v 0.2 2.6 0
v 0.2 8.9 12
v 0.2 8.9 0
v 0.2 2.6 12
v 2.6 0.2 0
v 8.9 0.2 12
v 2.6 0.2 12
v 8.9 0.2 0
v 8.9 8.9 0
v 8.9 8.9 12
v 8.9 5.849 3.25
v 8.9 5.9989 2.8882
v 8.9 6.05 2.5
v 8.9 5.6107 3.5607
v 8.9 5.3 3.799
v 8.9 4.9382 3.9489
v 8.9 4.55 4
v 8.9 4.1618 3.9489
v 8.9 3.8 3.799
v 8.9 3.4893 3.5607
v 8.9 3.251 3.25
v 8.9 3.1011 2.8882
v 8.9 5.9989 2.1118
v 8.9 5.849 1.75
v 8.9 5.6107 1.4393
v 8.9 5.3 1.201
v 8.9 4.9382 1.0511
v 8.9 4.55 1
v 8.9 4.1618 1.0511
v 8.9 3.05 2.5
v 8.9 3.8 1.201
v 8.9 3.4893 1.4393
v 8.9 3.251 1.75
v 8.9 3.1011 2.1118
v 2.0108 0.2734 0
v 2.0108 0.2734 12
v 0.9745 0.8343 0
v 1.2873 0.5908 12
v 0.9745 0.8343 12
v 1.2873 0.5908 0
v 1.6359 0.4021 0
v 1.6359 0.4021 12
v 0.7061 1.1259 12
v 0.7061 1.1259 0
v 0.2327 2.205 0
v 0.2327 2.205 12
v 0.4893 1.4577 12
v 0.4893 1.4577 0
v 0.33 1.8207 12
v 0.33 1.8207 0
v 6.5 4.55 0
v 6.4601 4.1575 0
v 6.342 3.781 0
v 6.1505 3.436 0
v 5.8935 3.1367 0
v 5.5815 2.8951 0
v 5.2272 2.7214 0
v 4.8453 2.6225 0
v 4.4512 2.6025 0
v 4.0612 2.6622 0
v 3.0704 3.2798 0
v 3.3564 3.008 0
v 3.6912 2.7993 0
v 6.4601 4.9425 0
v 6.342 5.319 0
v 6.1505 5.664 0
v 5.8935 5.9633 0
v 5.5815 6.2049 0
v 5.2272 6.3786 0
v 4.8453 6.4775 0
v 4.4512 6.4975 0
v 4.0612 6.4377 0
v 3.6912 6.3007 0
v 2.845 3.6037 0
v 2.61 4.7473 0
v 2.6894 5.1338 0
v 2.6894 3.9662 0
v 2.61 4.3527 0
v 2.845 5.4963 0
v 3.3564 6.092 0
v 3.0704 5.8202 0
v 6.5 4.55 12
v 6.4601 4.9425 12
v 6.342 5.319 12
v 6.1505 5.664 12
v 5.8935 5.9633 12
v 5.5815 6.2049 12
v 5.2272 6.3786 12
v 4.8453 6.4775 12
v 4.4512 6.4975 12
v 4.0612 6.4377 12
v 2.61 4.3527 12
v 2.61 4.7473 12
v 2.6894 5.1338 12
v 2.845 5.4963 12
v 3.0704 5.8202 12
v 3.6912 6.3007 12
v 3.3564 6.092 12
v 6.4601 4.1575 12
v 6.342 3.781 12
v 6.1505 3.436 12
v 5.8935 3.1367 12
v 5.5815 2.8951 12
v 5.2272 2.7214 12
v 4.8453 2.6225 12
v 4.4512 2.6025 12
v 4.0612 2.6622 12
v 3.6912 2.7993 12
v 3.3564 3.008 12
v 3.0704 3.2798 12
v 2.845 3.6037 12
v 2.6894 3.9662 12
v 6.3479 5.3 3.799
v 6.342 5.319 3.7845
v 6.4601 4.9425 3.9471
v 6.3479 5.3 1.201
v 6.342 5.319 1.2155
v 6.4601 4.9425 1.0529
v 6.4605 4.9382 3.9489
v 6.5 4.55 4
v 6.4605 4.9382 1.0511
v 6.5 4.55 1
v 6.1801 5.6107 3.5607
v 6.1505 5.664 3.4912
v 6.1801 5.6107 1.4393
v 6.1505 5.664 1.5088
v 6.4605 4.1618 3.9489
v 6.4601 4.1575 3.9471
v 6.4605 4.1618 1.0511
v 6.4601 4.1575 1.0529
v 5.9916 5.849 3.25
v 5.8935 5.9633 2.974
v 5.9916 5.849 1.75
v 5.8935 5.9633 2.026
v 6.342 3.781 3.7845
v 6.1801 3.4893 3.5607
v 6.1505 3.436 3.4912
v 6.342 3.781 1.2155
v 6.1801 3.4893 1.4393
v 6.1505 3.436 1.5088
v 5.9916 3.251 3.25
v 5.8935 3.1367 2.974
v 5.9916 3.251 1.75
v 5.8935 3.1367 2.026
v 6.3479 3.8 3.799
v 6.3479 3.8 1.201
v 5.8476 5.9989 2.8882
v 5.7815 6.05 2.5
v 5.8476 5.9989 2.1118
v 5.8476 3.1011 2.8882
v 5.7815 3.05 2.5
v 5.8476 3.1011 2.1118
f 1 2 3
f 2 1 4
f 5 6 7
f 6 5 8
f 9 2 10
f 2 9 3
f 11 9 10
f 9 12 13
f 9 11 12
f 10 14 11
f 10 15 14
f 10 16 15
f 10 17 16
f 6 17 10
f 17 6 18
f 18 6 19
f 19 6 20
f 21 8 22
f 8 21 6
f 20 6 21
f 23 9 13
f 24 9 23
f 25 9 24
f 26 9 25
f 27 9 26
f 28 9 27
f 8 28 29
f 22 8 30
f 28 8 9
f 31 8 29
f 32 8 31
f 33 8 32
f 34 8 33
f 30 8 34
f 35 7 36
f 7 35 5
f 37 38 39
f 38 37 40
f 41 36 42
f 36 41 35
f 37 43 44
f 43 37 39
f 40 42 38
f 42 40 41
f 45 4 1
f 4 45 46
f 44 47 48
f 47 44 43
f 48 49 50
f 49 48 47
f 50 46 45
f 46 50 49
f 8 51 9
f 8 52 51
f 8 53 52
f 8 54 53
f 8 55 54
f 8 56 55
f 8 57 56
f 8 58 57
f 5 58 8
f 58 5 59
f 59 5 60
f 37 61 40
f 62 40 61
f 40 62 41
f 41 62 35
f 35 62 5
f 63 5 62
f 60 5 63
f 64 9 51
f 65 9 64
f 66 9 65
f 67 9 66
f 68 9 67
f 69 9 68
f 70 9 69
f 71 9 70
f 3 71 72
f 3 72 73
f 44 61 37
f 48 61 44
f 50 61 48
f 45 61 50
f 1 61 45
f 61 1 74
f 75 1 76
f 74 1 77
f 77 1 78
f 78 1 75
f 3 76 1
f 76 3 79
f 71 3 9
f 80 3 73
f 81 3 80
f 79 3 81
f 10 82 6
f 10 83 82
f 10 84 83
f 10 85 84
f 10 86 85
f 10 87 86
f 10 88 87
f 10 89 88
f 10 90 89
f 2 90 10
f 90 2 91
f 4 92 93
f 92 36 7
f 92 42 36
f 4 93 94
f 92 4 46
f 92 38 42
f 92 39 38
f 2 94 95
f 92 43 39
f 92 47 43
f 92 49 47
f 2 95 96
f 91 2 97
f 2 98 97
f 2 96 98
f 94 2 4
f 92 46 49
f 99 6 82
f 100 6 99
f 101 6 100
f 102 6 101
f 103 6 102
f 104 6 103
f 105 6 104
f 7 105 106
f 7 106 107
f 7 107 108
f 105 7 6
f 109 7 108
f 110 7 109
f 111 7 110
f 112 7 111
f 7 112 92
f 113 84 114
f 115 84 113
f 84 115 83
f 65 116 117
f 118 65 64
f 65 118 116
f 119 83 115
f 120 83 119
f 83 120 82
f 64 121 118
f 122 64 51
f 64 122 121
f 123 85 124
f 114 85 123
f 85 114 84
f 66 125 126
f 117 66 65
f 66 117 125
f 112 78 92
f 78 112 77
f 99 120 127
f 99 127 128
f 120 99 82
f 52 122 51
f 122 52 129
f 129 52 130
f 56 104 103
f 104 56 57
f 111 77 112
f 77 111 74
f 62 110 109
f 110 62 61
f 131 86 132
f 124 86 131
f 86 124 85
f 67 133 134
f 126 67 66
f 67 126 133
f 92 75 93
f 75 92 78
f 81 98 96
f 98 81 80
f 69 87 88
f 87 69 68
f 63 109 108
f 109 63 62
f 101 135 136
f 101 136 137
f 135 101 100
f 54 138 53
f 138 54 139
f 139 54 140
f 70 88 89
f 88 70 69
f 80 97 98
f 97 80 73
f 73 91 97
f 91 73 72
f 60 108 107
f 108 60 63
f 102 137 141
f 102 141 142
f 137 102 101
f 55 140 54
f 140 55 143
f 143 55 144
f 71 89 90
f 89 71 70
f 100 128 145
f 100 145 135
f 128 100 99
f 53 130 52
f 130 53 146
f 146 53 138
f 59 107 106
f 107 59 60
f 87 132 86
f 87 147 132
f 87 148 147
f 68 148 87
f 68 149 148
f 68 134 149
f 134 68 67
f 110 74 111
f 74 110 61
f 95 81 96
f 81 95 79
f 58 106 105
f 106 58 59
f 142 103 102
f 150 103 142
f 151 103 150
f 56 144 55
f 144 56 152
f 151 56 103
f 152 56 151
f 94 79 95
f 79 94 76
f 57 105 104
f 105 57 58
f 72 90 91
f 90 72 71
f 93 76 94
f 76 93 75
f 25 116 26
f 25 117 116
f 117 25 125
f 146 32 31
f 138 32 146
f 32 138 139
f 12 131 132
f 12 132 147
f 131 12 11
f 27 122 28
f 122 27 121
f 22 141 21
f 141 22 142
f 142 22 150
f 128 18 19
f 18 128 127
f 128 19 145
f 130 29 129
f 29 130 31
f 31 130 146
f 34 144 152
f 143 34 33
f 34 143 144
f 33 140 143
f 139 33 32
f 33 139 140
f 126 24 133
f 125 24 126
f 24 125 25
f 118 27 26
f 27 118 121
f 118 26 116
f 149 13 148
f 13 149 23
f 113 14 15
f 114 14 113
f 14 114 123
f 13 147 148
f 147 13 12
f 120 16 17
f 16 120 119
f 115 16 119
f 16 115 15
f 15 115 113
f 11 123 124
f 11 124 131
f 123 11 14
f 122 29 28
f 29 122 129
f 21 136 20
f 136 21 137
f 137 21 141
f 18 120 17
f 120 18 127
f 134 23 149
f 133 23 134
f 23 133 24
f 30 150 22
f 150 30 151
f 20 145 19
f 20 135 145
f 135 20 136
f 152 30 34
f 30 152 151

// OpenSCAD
// ============================================================================
//  Canary — SHOP TOOLS  ⚠️ IN DEVELOPMENT (v0.2.1-dev)
//    part = "insert_guide" — heat-set insert press guide: a corner block
//        that drops into a bore corner of the face-down shell, sits on the
//        ledge with two faces on the bore walls, and holds its bore over a
//        corner post's insert bore (screw_insert mode) — keeping the M2
//        insert and iron tip SQUARE while it melts in (crooked inserts are
//        the #1 insert failure). Print in PETG minimum (it touches hot
//        zones briefly); remove as soon as the insert seats.
//    part = "button_ring" — decorative accent ring for the doorbell button
//        bezel seat: sits under the 12 mm button flange, prints in any
//        contrast color (the Ring-faceplate delight, in 0.4 g).
//
//  ⚠️ DEV STATUS: render/mesh-verified only — NOT print-validated.
//
//  v0.2-dev (2026-10-23): the insert guide could not seat. It was a tube
//  meant to slip over a Ø6.7 post, but no catalog corner post is free to
//  slip over: each stands 0.2 INTO two walls, its corner filled to the
//  walls, gusseted to 0.5 short of its end — and none is Ø6.7 (the WAP's is
//  5.9, the Vision's, Sense's and doorbell's 6.5). Set over the WAP's post
//  the tube met 237 mm³ of shell. It is now a block that registers where
//  every piston-plate case is the same shape: the bore corner, on the
//  ledge, tol_slide off both bore walls, with its bore on the post's axis
//  (post_dx/post_dy, measured per case in their help). The button ring took
//  tol_slide off twice (Ø16.1 in the Ø16.9 seat, 0.4 a side): it is now
//  bez_d, tol_slide a side once.
//
//  v0.2.1-dev (2026-10-23, the cross-family review): the help listed one
//  offset per case, but a sealed build's ledge is 4.6 wide, not 1.8, so its
//  posts sit 2.8 further in and its bore corner is r5.4: probed with
//  screw_insert on, the Outdoor WAP (battery_weather) is 7.35 / r5.4 and the
//  weather Vision and the sealed Sense 7.65 / r5.4. A guide printed at the
//  WAP's 4.55 for an Outdoor WAP held its bore 2.8 off the post on each axis
//  (and its corner could not reach into the r5.4 corner). The help lists
//  every insert host now; no geometry moved.
// ============================================================================

/* [What to render] */
part = "insert_guide";   // ["insert_guide","button_ring"]

/* [Insert guide] — sits in a bore corner on the ledge, over a screw_insert post */
post_dx  = 4.55;     // post center from the bore wall along X (ledge_w + the post's offset from the cavity wall): WAP 4.55, Vision and Sense 4.85; sealed: WAP (battery_weather) 7.35, Vision (vision_weather) and Sense 7.65, doorbell 8.85
post_dy  = 4.55;     // post center from the bore wall along Y: WAP 4.55, Vision and Sense 4.85; sealed: WAP (battery_weather) 7.35, Vision (vision_weather) and Sense 7.65, doorbell 8.85
bore_corner_r = 2.6; // the plate bore's corner radius (the case's bore_r): 2.6 on the unsealed WAP, Vision and Sense, 5.4 on the sealed WAP, Vision and Sense, 10.8 on the sealed doorbell
insert_d = 3.5;      // insert knurl OD (M2 short series); the guide bore passes it with 0.2 a side
guide_h  = 12.0;     // guide height above the ledge — the length that holds the iron square

/* [Button ring] — matches the doorbell bezel seat */
bez_d = 16.5;        // bezel seat diameter
btn_d = 12.0;        // button body diameter
ring_t = 0.8;

/* [Print tolerances] */
tol_slide = 0.20;    // catalog default — core_tol_slide(), canary_core_lib

/* [Quality] */
$fa = 3; $fs = 0.4;

echo(str("Canary shop tools v0.2.1-dev — ", part, "  (IN DEVELOPMENT)"));

// The bore corner at the origin, its walls on x = 0 and y = 0, the block in
// +x +y; z = 0 is the face that sits on the ledge (the post end is
// pl_relief's 0.2 under it, so the insert leaves the guide straight into its bore)
module insert_guide() {
    sx = post_dx + (insert_d + 0.4)/2 + 2.4;   // the block: the guide bore plus a 2.4 wall past it
    sy = post_dy + (insert_d + 0.4)/2 + 2.4;
    difference() {
        linear_extrude(guide_h) intersection() {
            translate([tol_slide, tol_slide]) square([sx - tol_slide, sy - tol_slide]);   // tol_slide off both bore walls
            translate([bore_corner_r, bore_corner_r])                                   // and inside the bore's corner radius
                offset(r = max(bore_corner_r - tol_slide, 0.4)) square([sx, sy]);
        }
        // the guide bore, on the post's axis: keeps the insert + iron tip square
        translate([post_dx, post_dy, -0.1]) cylinder(d = insert_d + 0.4, h = guide_h + 0.2);
        // window low in the free +X face, to watch the insert leave the guide into the post
        translate([post_dx, post_dy, 2.5]) rotate([0, 90, 0]) cylinder(d = 3, h = sx);
    }
}

module button_ring() {
    difference() {
        cylinder(d = bez_d, h = ring_t);   // the seat is cut bez_d + 2*tol_slide: tol_slide a side, once (v0.2)
        translate([0, 0, -0.1]) cylinder(d = btn_d + 2*tol_slide + 0.6, h = ring_t + 0.2);
    }
}

if (part == "insert_guide") insert_guide();
else button_ring();
